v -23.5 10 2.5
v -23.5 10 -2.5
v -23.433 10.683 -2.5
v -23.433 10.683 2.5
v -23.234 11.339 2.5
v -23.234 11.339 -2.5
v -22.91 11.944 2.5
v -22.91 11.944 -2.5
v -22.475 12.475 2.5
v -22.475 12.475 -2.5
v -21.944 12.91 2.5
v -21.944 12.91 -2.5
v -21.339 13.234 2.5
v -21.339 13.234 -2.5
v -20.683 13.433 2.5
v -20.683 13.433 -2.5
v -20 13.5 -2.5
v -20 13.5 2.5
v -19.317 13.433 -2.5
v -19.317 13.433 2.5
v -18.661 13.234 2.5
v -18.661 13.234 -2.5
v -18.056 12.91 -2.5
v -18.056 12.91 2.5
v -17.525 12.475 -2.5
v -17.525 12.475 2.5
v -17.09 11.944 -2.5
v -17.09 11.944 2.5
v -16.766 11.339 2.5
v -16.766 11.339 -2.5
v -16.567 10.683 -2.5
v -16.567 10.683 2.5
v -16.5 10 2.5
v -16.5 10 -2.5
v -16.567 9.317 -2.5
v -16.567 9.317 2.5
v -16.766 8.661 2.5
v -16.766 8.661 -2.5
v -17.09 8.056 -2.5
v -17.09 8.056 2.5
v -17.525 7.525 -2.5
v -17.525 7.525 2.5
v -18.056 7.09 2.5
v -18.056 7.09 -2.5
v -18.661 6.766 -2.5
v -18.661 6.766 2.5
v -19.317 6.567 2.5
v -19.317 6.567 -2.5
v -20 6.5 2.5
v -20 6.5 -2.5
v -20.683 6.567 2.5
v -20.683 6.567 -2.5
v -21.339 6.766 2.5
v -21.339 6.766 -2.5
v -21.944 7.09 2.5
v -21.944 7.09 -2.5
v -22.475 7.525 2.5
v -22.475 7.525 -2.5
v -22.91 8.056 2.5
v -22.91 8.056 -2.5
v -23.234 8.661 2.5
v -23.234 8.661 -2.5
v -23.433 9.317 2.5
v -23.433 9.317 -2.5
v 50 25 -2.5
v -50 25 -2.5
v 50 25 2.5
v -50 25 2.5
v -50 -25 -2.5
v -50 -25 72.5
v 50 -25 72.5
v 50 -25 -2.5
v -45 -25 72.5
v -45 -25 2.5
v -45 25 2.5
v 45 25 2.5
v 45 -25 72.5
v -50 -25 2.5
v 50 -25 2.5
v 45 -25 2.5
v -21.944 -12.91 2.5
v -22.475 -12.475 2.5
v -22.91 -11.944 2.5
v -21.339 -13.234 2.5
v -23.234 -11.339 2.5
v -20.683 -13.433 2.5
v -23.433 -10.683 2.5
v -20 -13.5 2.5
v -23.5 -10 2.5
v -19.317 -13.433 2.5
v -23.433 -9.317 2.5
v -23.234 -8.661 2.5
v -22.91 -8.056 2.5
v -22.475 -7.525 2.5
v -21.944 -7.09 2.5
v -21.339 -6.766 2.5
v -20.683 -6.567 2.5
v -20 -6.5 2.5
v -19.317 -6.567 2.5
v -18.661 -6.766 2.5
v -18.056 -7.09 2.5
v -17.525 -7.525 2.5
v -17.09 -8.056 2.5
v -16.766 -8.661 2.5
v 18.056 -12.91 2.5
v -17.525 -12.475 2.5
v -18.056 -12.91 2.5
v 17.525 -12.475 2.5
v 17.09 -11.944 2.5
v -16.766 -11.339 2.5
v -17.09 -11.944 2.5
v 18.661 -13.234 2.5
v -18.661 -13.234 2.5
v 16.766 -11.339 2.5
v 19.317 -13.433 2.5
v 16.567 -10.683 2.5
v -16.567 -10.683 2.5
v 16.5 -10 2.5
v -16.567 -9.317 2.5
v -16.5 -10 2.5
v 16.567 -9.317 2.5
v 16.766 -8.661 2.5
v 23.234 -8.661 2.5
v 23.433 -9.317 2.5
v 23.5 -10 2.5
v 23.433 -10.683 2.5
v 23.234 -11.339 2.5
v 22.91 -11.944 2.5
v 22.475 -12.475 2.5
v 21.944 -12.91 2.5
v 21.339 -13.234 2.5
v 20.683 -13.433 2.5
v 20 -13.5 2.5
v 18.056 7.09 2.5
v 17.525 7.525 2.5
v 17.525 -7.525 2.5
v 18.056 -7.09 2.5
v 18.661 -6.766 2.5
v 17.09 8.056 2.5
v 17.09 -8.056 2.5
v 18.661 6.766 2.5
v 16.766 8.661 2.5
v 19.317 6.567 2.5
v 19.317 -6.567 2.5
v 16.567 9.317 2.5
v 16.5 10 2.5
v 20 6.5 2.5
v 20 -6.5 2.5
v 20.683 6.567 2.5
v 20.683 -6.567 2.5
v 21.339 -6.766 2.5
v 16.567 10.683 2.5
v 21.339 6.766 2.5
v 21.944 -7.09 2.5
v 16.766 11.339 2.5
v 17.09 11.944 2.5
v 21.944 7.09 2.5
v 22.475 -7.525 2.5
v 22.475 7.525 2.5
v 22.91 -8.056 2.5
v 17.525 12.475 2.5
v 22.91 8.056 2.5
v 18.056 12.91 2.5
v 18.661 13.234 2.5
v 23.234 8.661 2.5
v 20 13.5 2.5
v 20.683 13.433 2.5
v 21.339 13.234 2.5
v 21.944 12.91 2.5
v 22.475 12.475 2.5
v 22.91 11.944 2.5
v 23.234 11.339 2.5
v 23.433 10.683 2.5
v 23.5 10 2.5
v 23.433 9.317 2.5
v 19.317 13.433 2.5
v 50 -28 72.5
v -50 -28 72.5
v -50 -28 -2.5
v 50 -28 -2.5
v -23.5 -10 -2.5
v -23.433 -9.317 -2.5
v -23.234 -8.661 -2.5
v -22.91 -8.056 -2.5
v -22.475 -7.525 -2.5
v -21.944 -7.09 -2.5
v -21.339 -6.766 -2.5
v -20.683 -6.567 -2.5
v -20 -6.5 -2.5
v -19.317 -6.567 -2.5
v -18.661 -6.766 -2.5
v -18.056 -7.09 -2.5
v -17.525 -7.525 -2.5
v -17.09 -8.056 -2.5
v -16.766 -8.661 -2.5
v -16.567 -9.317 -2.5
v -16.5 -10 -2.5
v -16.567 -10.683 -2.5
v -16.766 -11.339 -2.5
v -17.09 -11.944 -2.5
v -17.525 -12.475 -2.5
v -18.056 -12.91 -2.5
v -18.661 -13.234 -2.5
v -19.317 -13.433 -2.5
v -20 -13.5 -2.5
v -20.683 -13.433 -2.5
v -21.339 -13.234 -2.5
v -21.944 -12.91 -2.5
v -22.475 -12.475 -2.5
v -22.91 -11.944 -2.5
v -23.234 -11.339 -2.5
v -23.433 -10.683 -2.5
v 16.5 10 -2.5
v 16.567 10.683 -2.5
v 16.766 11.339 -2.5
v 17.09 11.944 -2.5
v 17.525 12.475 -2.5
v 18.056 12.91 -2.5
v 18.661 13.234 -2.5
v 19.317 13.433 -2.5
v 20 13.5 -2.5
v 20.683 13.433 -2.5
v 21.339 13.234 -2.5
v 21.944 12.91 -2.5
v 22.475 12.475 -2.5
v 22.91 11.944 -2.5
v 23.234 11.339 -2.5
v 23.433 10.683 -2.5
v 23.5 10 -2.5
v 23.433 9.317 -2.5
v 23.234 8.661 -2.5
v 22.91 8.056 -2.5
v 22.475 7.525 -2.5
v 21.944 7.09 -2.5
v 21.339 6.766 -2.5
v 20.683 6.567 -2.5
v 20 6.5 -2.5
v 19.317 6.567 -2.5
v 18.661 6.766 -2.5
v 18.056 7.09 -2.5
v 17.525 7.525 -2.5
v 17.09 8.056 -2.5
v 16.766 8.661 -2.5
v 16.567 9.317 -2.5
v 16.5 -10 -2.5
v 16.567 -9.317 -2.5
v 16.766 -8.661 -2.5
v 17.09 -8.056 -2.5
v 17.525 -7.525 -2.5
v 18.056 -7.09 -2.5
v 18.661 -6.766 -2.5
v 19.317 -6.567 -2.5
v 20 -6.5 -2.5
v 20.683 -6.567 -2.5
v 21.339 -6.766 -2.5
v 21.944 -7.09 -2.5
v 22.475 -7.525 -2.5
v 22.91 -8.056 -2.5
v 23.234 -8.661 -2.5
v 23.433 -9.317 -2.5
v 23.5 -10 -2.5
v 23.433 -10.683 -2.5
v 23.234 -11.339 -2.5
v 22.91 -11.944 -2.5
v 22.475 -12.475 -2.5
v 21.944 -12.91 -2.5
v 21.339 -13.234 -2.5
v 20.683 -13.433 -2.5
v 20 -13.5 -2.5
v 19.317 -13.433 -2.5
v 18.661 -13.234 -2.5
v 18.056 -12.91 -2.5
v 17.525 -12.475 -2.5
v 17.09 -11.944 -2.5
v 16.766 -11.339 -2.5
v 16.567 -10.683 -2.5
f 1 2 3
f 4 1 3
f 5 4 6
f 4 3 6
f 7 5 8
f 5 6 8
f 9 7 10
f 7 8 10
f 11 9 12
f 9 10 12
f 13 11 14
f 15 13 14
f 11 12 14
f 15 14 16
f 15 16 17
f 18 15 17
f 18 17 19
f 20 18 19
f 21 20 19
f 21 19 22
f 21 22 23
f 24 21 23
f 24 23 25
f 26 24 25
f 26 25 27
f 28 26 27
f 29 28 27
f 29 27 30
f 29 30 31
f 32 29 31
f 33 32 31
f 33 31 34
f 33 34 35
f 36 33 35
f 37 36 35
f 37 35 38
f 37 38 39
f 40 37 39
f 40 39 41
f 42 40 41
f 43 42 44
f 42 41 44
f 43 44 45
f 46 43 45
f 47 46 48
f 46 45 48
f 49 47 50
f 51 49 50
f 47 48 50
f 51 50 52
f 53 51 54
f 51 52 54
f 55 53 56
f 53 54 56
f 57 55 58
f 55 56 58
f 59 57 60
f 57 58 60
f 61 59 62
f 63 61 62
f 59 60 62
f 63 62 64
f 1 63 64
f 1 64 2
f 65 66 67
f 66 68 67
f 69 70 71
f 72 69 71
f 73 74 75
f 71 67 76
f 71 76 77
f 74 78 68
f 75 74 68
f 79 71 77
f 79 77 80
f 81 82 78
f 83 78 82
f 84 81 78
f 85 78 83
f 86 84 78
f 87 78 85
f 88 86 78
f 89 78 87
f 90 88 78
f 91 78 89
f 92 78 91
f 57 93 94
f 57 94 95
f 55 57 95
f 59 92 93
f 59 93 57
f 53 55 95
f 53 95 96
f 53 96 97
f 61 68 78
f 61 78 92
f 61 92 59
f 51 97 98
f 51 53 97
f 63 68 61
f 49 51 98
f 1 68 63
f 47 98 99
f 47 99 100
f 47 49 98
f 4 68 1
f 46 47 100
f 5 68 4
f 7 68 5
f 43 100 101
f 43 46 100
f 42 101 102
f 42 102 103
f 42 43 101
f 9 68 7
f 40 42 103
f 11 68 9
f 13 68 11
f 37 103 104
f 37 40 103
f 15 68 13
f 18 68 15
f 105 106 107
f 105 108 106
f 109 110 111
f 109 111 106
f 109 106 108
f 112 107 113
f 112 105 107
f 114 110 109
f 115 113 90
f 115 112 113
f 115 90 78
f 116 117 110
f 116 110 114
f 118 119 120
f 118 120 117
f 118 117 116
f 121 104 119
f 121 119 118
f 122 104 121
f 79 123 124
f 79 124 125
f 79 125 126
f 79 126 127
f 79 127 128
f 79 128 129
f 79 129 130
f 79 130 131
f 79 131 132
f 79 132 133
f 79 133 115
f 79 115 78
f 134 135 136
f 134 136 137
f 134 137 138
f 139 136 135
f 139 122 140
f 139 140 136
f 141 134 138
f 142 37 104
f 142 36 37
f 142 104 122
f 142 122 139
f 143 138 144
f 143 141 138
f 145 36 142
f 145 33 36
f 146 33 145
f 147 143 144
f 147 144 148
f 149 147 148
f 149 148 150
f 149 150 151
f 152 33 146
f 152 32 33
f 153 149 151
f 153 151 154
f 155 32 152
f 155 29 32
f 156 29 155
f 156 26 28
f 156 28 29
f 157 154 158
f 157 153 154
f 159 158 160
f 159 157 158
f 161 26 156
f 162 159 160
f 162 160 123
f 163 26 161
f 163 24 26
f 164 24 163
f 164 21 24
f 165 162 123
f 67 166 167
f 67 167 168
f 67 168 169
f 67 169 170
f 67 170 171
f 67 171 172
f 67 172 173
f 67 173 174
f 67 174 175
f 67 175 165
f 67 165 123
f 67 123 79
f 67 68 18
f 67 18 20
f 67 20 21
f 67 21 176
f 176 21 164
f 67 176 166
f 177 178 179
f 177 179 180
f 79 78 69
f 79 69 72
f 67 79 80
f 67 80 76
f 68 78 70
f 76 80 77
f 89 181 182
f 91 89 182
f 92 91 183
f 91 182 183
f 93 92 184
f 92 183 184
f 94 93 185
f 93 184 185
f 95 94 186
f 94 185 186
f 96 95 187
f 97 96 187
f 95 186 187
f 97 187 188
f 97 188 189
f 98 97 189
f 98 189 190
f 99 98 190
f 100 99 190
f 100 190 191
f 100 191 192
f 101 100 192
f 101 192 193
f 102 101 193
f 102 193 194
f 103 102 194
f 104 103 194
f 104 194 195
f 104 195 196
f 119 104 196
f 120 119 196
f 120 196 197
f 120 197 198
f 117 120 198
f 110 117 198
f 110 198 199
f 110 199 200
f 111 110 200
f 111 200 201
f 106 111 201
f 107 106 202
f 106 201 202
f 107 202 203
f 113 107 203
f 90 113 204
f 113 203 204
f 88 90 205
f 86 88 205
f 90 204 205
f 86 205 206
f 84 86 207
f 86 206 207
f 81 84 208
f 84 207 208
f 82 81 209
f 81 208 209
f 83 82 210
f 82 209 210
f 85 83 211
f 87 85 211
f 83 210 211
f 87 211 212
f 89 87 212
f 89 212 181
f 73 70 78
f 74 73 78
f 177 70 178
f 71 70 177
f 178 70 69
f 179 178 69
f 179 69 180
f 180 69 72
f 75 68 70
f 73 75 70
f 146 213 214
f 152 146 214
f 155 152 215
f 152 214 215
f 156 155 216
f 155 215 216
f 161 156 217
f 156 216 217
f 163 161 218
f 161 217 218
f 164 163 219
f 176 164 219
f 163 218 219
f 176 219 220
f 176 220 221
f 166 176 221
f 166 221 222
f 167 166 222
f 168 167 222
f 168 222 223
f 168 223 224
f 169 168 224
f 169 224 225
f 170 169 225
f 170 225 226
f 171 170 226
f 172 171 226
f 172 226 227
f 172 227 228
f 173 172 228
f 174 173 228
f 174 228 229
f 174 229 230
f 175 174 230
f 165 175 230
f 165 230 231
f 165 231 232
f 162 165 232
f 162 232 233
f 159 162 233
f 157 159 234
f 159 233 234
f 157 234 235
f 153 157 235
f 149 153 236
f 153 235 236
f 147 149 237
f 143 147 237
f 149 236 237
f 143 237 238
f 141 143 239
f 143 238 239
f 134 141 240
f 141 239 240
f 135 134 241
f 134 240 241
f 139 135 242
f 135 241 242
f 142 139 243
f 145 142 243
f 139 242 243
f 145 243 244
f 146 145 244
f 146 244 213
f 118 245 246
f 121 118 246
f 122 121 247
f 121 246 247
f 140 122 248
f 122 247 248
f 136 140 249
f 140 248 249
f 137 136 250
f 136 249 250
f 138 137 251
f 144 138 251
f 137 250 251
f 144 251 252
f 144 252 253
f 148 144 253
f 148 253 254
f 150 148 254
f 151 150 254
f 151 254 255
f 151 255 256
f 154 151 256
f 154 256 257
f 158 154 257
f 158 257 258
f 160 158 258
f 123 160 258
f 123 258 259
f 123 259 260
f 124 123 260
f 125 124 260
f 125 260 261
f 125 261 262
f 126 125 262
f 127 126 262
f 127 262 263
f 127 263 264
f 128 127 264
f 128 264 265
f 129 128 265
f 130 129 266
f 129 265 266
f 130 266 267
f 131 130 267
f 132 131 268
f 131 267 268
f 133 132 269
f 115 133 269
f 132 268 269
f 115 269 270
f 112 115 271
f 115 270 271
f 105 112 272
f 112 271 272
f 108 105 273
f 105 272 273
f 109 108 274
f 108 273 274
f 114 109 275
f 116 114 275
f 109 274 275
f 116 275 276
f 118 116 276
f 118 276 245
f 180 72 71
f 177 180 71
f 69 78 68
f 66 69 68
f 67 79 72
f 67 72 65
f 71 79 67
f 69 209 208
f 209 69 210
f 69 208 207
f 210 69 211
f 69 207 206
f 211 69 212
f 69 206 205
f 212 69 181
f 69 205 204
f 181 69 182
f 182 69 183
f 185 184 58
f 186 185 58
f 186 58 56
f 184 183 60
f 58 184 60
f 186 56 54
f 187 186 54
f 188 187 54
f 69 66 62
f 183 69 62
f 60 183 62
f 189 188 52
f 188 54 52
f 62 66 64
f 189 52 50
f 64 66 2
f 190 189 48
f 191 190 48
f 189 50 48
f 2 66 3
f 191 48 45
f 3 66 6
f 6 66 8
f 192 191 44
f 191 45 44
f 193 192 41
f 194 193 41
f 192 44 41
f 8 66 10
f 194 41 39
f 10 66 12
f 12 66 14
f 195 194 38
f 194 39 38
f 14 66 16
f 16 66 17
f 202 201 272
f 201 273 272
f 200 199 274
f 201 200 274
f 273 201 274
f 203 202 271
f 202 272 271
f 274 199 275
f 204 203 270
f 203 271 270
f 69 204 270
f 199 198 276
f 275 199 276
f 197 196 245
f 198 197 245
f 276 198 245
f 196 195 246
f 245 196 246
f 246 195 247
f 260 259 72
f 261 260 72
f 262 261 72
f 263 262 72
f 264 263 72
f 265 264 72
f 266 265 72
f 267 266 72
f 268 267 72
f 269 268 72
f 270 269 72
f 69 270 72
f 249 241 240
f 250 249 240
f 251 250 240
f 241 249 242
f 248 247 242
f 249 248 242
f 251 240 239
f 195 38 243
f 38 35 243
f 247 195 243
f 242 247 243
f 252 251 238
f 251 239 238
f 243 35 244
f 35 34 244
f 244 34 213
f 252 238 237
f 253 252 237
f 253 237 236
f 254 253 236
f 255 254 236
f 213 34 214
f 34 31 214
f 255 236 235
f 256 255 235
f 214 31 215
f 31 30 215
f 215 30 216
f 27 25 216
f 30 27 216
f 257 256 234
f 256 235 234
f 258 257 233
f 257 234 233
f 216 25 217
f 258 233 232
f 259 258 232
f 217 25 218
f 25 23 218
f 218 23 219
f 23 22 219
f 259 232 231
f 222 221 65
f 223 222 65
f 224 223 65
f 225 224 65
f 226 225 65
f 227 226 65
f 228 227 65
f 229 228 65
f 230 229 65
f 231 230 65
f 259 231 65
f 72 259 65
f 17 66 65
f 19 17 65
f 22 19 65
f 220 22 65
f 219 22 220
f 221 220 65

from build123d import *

# Parameters (mm, degrees)
F0_W     = 100
F0_H     = 50
F1_DEPTH = 2.5
F2_W     = 100
F2_H     = 70
F2_H_2   = 5
F3_DEPTH = 3
F5_DEPTH = 5
F8_D     = 7


with BuildPart() as f1:
    # F0 (on Top) → F1 (new body, symmetric)
    with BuildSketch(Plane.XY):
        Rectangle(F0_W, F0_H)
    extrude(amount=F1_DEPTH, both=True)

    # F8 (through all)
    with Locations(Plane.XY.offset(2.5)):
        with Locations((-20, -10), (20, -10), (-20, 10), (20, 10)):
            Hole(F8_D / 2)


with BuildPart() as f3:
    # F2 (on face) → F3 (new body)
    with BuildSketch(Plane.XZ.offset(25)):
        with Locations((0, 37.5)):
            Rectangle(F2_W, F2_H)
        Rectangle(F2_W, F2_H_2)
    extrude(amount=F3_DEPTH)


with BuildPart() as f5:
    # F4 (on face) → F5 (new body)
    with BuildSketch(Plane.YZ.offset(50)):
        Polygon((25, 2.5), (-25, 72.5), (-25, 2.5), align=None)
    extrude(amount=-F5_DEPTH)


with BuildPart() as f6_1:
    # F6: instance of F5
    add(f5.part.mirror(Plane.YZ))


solid = Compound([f1.part, f3.part, f5.part, f6_1.part])
